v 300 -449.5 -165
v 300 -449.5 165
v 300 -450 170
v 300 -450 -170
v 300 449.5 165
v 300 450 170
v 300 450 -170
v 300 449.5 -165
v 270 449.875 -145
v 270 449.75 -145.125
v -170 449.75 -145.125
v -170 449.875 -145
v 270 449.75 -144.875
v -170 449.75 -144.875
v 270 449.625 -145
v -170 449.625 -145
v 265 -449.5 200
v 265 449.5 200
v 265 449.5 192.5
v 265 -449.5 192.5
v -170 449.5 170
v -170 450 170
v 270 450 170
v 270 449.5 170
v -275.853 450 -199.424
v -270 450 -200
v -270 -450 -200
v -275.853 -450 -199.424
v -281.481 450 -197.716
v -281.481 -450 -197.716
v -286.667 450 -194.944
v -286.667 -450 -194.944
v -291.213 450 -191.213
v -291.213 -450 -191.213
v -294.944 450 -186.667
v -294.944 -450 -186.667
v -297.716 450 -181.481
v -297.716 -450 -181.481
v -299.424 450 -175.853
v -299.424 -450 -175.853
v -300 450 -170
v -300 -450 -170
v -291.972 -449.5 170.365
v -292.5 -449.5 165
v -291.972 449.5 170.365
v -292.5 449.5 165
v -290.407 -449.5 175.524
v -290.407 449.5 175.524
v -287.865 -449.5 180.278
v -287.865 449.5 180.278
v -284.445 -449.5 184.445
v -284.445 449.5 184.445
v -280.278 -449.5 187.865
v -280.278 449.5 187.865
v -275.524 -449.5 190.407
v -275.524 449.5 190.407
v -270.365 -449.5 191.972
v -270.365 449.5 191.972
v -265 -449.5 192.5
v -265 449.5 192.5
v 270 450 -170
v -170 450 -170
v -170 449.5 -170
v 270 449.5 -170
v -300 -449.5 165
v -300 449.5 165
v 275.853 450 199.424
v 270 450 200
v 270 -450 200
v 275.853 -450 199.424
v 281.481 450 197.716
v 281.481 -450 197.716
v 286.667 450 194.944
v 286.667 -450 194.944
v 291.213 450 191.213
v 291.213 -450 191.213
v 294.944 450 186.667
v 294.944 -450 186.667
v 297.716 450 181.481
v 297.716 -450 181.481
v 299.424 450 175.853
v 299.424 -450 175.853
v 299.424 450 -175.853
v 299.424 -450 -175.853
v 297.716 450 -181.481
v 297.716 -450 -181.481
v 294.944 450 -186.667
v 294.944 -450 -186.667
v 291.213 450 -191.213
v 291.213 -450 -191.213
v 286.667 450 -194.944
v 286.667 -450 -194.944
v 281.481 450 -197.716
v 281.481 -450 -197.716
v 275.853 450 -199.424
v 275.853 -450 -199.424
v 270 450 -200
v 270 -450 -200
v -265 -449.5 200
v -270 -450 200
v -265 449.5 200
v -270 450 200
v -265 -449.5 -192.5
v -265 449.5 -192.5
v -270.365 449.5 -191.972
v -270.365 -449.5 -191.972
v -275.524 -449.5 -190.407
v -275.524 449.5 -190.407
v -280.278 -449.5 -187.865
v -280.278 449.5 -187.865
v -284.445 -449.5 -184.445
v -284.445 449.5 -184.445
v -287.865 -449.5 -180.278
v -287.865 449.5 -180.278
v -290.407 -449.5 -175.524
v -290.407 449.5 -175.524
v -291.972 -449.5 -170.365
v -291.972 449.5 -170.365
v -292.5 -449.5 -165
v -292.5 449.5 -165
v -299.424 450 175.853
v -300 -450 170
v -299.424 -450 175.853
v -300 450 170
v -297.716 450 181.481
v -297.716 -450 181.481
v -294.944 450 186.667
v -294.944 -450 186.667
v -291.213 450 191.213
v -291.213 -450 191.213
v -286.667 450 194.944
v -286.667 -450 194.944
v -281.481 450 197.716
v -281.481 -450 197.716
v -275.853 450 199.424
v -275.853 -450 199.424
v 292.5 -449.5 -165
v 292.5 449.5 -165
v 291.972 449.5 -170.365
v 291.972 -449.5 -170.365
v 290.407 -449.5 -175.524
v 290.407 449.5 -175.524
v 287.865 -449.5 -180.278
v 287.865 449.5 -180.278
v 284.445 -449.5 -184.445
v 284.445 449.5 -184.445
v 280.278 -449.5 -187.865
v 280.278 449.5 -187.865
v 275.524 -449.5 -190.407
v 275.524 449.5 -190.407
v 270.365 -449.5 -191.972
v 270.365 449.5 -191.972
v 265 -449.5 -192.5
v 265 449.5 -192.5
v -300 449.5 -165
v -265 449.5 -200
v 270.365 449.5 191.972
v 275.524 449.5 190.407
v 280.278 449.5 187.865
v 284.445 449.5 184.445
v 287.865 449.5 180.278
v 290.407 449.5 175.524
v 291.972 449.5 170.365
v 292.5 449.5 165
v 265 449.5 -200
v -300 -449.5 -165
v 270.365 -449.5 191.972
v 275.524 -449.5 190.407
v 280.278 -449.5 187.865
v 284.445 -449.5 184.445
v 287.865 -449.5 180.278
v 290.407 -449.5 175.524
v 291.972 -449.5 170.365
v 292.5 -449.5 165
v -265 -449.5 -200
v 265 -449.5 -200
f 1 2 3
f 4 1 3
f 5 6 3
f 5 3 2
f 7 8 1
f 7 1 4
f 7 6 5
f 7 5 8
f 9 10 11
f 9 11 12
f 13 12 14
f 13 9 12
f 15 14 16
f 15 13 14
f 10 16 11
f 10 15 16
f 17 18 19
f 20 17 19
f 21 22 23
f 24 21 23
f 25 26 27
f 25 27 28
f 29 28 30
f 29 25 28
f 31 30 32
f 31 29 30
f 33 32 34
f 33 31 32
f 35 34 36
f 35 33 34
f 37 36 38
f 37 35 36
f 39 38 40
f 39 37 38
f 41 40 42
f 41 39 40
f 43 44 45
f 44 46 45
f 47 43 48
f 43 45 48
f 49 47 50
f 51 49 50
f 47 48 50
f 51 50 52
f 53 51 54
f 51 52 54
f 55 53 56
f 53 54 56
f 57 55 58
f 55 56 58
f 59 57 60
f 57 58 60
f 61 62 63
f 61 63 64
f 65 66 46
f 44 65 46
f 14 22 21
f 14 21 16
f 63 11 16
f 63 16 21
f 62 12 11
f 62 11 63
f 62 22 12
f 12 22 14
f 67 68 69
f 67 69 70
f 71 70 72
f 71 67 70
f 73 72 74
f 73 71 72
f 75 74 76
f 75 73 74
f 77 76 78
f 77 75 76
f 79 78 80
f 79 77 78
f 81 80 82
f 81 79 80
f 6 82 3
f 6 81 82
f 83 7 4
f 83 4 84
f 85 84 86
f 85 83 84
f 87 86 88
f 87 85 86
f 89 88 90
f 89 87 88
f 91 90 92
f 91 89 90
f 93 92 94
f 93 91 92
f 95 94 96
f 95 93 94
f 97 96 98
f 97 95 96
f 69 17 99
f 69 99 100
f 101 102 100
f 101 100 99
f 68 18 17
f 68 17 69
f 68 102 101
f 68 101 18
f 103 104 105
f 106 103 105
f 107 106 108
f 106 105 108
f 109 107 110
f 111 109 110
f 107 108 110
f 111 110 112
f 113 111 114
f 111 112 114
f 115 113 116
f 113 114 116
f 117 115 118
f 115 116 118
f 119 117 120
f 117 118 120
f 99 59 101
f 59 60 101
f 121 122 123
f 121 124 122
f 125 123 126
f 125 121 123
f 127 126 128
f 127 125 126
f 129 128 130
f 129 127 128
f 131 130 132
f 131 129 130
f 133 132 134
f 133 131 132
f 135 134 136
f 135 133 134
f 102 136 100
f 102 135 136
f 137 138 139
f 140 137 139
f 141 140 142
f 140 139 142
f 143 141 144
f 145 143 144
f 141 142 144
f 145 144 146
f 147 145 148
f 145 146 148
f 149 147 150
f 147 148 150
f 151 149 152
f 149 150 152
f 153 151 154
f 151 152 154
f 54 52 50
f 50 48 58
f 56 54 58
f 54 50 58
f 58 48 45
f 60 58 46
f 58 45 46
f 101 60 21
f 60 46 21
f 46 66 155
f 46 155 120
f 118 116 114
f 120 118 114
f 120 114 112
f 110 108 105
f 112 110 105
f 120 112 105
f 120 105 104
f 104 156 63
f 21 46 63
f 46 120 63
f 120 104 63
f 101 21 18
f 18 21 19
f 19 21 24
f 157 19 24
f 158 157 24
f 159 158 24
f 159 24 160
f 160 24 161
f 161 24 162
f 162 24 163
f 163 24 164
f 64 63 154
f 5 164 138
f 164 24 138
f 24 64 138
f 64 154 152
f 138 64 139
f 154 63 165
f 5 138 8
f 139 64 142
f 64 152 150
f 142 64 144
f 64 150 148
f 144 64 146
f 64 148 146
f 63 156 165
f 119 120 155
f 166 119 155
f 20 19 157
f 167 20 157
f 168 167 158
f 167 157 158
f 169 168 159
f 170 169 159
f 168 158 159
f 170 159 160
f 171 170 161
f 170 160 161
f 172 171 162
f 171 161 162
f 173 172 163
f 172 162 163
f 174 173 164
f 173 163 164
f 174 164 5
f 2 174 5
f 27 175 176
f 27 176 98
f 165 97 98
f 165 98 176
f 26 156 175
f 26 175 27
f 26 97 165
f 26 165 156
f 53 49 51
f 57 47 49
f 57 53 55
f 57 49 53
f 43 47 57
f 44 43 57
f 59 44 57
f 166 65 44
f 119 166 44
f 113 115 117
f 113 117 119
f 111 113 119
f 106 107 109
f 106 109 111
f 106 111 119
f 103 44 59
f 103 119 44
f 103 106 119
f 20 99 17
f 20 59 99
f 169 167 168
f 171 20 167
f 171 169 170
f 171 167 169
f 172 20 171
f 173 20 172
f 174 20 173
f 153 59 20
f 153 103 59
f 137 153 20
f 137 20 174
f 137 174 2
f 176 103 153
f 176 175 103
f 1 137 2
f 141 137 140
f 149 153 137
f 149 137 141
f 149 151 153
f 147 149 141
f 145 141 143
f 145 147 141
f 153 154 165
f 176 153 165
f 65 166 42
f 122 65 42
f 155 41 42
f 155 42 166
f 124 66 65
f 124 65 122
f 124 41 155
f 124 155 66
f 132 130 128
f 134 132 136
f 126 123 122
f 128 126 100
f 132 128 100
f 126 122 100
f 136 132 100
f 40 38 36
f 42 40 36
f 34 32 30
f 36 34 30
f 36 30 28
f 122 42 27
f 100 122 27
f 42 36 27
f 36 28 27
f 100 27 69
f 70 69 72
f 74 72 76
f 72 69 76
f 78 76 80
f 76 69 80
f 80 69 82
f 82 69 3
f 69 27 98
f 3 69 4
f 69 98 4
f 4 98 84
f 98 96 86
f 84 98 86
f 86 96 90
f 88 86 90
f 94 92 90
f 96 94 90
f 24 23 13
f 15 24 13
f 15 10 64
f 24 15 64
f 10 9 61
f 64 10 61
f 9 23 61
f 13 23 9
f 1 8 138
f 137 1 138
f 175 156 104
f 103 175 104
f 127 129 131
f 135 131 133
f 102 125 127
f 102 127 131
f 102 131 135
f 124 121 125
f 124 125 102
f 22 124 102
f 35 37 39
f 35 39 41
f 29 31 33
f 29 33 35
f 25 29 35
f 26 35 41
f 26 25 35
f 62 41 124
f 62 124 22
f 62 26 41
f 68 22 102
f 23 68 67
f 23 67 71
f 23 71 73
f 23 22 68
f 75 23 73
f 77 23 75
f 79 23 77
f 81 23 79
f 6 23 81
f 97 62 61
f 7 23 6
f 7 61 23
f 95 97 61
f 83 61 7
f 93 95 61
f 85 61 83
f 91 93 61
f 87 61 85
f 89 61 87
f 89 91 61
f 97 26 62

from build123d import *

# Parameters (mm, degrees)
BOSS_EXTRUDE1_DEPTH = 450
CUT_EXTRUDE1_DEPTH  = 449.5
SKETCH4_W           = 440
SKETCH4_H           = 340
CUT_EXTRUDE2_DEPTH  = 10
SKETCH7_R           = 0.125
BOSS_EXTRUDE2_DEPTH = 470


with BuildPart() as part:
    # Sketch2 → Boss-Extrude1 (new, symmetric)
    with BuildSketch(Plane(origin=(0, 0, 0), x_dir=(1, 0, 0), z_dir=(0, 1, 0))):
        with BuildLine():
            Line((-270, -200), (270, -200))
            ThreePointArc((270, -200), (291.213203436, -191.213203436), (300, -170))
            Line((300, -170), (300, 170))
            ThreePointArc((300, 170), (291.213203436, 191.213203436), (270, 200))
            Line((270, 200), (-270, 200))
            ThreePointArc((-270, 200), (-291.213203436, 191.213203436), (-300, 170))
            Line((-300, 170), (-300, -170))
            ThreePointArc((-300, -170), (-291.213203436, -191.213203436), (-270, -200))
        make_face()
    extrude(amount=BOSS_EXTRUDE1_DEPTH, both=True)

    # Sketch3 → Cut-Extrude1 (cut, symmetric)
    with BuildSketch(Plane(origin=(0, 0, 0), x_dir=(1, 0, 0), z_dir=(0, 1, 0))):
        with BuildLine():
            Line((-265, -200), (265, -200))
            Line((265, -200), (265, -192.5))
            ThreePointArc((265, -192.5), (284.445436483, -184.445436483), (292.5, -165))
            Line((292.5, -165), (300, -165))
            Line((300, -165), (300, 165))
            Line((300, 165), (292.5, 165))
            ThreePointArc((292.5, 165), (284.445436483, 184.445436483), (265, 192.5))
            Line((265, 192.5), (265, 200))
            Line((265, 200), (-265, 200))
            Line((-265, 200), (-265, 192.5))
            ThreePointArc((-265, 192.5), (-284.445436483, 184.445436483), (-292.5, 165))
            Line((-292.5, 165), (-300, 165))
            Line((-300, 165), (-300, -165))
            Line((-300, -165), (-292.5, -165))
            ThreePointArc((-292.5, -165), (-284.445436483, -184.445436483), (-265, -192.5))
            Line((-265, -192.5), (-265, -200))
        make_face()
    extrude(amount=CUT_EXTRUDE1_DEPTH, both=True, mode=Mode.SUBTRACT)

    # Sketch4 → Cut-Extrude2 (cut)
    with BuildSketch(Plane(origin=(0, 450, 0), x_dir=(1, 0, 0), z_dir=(0, 1, 0))):
        with Locations((50, 0)):
            Rectangle(SKETCH4_W, SKETCH4_H)
    extrude(amount=-CUT_EXTRUDE2_DEPTH, mode=Mode.SUBTRACT)

    # Sketch7 → Boss-Extrude2 (add)
    with BuildSketch(Plane(origin=(300, 0, 0), x_dir=(0, 0, -1), z_dir=(1, 0, 0))):
        with Locations((145, 449.75)):
            Circle(SKETCH7_R)
    extrude(amount=-BOSS_EXTRUDE2_DEPTH)


solid = part.part
